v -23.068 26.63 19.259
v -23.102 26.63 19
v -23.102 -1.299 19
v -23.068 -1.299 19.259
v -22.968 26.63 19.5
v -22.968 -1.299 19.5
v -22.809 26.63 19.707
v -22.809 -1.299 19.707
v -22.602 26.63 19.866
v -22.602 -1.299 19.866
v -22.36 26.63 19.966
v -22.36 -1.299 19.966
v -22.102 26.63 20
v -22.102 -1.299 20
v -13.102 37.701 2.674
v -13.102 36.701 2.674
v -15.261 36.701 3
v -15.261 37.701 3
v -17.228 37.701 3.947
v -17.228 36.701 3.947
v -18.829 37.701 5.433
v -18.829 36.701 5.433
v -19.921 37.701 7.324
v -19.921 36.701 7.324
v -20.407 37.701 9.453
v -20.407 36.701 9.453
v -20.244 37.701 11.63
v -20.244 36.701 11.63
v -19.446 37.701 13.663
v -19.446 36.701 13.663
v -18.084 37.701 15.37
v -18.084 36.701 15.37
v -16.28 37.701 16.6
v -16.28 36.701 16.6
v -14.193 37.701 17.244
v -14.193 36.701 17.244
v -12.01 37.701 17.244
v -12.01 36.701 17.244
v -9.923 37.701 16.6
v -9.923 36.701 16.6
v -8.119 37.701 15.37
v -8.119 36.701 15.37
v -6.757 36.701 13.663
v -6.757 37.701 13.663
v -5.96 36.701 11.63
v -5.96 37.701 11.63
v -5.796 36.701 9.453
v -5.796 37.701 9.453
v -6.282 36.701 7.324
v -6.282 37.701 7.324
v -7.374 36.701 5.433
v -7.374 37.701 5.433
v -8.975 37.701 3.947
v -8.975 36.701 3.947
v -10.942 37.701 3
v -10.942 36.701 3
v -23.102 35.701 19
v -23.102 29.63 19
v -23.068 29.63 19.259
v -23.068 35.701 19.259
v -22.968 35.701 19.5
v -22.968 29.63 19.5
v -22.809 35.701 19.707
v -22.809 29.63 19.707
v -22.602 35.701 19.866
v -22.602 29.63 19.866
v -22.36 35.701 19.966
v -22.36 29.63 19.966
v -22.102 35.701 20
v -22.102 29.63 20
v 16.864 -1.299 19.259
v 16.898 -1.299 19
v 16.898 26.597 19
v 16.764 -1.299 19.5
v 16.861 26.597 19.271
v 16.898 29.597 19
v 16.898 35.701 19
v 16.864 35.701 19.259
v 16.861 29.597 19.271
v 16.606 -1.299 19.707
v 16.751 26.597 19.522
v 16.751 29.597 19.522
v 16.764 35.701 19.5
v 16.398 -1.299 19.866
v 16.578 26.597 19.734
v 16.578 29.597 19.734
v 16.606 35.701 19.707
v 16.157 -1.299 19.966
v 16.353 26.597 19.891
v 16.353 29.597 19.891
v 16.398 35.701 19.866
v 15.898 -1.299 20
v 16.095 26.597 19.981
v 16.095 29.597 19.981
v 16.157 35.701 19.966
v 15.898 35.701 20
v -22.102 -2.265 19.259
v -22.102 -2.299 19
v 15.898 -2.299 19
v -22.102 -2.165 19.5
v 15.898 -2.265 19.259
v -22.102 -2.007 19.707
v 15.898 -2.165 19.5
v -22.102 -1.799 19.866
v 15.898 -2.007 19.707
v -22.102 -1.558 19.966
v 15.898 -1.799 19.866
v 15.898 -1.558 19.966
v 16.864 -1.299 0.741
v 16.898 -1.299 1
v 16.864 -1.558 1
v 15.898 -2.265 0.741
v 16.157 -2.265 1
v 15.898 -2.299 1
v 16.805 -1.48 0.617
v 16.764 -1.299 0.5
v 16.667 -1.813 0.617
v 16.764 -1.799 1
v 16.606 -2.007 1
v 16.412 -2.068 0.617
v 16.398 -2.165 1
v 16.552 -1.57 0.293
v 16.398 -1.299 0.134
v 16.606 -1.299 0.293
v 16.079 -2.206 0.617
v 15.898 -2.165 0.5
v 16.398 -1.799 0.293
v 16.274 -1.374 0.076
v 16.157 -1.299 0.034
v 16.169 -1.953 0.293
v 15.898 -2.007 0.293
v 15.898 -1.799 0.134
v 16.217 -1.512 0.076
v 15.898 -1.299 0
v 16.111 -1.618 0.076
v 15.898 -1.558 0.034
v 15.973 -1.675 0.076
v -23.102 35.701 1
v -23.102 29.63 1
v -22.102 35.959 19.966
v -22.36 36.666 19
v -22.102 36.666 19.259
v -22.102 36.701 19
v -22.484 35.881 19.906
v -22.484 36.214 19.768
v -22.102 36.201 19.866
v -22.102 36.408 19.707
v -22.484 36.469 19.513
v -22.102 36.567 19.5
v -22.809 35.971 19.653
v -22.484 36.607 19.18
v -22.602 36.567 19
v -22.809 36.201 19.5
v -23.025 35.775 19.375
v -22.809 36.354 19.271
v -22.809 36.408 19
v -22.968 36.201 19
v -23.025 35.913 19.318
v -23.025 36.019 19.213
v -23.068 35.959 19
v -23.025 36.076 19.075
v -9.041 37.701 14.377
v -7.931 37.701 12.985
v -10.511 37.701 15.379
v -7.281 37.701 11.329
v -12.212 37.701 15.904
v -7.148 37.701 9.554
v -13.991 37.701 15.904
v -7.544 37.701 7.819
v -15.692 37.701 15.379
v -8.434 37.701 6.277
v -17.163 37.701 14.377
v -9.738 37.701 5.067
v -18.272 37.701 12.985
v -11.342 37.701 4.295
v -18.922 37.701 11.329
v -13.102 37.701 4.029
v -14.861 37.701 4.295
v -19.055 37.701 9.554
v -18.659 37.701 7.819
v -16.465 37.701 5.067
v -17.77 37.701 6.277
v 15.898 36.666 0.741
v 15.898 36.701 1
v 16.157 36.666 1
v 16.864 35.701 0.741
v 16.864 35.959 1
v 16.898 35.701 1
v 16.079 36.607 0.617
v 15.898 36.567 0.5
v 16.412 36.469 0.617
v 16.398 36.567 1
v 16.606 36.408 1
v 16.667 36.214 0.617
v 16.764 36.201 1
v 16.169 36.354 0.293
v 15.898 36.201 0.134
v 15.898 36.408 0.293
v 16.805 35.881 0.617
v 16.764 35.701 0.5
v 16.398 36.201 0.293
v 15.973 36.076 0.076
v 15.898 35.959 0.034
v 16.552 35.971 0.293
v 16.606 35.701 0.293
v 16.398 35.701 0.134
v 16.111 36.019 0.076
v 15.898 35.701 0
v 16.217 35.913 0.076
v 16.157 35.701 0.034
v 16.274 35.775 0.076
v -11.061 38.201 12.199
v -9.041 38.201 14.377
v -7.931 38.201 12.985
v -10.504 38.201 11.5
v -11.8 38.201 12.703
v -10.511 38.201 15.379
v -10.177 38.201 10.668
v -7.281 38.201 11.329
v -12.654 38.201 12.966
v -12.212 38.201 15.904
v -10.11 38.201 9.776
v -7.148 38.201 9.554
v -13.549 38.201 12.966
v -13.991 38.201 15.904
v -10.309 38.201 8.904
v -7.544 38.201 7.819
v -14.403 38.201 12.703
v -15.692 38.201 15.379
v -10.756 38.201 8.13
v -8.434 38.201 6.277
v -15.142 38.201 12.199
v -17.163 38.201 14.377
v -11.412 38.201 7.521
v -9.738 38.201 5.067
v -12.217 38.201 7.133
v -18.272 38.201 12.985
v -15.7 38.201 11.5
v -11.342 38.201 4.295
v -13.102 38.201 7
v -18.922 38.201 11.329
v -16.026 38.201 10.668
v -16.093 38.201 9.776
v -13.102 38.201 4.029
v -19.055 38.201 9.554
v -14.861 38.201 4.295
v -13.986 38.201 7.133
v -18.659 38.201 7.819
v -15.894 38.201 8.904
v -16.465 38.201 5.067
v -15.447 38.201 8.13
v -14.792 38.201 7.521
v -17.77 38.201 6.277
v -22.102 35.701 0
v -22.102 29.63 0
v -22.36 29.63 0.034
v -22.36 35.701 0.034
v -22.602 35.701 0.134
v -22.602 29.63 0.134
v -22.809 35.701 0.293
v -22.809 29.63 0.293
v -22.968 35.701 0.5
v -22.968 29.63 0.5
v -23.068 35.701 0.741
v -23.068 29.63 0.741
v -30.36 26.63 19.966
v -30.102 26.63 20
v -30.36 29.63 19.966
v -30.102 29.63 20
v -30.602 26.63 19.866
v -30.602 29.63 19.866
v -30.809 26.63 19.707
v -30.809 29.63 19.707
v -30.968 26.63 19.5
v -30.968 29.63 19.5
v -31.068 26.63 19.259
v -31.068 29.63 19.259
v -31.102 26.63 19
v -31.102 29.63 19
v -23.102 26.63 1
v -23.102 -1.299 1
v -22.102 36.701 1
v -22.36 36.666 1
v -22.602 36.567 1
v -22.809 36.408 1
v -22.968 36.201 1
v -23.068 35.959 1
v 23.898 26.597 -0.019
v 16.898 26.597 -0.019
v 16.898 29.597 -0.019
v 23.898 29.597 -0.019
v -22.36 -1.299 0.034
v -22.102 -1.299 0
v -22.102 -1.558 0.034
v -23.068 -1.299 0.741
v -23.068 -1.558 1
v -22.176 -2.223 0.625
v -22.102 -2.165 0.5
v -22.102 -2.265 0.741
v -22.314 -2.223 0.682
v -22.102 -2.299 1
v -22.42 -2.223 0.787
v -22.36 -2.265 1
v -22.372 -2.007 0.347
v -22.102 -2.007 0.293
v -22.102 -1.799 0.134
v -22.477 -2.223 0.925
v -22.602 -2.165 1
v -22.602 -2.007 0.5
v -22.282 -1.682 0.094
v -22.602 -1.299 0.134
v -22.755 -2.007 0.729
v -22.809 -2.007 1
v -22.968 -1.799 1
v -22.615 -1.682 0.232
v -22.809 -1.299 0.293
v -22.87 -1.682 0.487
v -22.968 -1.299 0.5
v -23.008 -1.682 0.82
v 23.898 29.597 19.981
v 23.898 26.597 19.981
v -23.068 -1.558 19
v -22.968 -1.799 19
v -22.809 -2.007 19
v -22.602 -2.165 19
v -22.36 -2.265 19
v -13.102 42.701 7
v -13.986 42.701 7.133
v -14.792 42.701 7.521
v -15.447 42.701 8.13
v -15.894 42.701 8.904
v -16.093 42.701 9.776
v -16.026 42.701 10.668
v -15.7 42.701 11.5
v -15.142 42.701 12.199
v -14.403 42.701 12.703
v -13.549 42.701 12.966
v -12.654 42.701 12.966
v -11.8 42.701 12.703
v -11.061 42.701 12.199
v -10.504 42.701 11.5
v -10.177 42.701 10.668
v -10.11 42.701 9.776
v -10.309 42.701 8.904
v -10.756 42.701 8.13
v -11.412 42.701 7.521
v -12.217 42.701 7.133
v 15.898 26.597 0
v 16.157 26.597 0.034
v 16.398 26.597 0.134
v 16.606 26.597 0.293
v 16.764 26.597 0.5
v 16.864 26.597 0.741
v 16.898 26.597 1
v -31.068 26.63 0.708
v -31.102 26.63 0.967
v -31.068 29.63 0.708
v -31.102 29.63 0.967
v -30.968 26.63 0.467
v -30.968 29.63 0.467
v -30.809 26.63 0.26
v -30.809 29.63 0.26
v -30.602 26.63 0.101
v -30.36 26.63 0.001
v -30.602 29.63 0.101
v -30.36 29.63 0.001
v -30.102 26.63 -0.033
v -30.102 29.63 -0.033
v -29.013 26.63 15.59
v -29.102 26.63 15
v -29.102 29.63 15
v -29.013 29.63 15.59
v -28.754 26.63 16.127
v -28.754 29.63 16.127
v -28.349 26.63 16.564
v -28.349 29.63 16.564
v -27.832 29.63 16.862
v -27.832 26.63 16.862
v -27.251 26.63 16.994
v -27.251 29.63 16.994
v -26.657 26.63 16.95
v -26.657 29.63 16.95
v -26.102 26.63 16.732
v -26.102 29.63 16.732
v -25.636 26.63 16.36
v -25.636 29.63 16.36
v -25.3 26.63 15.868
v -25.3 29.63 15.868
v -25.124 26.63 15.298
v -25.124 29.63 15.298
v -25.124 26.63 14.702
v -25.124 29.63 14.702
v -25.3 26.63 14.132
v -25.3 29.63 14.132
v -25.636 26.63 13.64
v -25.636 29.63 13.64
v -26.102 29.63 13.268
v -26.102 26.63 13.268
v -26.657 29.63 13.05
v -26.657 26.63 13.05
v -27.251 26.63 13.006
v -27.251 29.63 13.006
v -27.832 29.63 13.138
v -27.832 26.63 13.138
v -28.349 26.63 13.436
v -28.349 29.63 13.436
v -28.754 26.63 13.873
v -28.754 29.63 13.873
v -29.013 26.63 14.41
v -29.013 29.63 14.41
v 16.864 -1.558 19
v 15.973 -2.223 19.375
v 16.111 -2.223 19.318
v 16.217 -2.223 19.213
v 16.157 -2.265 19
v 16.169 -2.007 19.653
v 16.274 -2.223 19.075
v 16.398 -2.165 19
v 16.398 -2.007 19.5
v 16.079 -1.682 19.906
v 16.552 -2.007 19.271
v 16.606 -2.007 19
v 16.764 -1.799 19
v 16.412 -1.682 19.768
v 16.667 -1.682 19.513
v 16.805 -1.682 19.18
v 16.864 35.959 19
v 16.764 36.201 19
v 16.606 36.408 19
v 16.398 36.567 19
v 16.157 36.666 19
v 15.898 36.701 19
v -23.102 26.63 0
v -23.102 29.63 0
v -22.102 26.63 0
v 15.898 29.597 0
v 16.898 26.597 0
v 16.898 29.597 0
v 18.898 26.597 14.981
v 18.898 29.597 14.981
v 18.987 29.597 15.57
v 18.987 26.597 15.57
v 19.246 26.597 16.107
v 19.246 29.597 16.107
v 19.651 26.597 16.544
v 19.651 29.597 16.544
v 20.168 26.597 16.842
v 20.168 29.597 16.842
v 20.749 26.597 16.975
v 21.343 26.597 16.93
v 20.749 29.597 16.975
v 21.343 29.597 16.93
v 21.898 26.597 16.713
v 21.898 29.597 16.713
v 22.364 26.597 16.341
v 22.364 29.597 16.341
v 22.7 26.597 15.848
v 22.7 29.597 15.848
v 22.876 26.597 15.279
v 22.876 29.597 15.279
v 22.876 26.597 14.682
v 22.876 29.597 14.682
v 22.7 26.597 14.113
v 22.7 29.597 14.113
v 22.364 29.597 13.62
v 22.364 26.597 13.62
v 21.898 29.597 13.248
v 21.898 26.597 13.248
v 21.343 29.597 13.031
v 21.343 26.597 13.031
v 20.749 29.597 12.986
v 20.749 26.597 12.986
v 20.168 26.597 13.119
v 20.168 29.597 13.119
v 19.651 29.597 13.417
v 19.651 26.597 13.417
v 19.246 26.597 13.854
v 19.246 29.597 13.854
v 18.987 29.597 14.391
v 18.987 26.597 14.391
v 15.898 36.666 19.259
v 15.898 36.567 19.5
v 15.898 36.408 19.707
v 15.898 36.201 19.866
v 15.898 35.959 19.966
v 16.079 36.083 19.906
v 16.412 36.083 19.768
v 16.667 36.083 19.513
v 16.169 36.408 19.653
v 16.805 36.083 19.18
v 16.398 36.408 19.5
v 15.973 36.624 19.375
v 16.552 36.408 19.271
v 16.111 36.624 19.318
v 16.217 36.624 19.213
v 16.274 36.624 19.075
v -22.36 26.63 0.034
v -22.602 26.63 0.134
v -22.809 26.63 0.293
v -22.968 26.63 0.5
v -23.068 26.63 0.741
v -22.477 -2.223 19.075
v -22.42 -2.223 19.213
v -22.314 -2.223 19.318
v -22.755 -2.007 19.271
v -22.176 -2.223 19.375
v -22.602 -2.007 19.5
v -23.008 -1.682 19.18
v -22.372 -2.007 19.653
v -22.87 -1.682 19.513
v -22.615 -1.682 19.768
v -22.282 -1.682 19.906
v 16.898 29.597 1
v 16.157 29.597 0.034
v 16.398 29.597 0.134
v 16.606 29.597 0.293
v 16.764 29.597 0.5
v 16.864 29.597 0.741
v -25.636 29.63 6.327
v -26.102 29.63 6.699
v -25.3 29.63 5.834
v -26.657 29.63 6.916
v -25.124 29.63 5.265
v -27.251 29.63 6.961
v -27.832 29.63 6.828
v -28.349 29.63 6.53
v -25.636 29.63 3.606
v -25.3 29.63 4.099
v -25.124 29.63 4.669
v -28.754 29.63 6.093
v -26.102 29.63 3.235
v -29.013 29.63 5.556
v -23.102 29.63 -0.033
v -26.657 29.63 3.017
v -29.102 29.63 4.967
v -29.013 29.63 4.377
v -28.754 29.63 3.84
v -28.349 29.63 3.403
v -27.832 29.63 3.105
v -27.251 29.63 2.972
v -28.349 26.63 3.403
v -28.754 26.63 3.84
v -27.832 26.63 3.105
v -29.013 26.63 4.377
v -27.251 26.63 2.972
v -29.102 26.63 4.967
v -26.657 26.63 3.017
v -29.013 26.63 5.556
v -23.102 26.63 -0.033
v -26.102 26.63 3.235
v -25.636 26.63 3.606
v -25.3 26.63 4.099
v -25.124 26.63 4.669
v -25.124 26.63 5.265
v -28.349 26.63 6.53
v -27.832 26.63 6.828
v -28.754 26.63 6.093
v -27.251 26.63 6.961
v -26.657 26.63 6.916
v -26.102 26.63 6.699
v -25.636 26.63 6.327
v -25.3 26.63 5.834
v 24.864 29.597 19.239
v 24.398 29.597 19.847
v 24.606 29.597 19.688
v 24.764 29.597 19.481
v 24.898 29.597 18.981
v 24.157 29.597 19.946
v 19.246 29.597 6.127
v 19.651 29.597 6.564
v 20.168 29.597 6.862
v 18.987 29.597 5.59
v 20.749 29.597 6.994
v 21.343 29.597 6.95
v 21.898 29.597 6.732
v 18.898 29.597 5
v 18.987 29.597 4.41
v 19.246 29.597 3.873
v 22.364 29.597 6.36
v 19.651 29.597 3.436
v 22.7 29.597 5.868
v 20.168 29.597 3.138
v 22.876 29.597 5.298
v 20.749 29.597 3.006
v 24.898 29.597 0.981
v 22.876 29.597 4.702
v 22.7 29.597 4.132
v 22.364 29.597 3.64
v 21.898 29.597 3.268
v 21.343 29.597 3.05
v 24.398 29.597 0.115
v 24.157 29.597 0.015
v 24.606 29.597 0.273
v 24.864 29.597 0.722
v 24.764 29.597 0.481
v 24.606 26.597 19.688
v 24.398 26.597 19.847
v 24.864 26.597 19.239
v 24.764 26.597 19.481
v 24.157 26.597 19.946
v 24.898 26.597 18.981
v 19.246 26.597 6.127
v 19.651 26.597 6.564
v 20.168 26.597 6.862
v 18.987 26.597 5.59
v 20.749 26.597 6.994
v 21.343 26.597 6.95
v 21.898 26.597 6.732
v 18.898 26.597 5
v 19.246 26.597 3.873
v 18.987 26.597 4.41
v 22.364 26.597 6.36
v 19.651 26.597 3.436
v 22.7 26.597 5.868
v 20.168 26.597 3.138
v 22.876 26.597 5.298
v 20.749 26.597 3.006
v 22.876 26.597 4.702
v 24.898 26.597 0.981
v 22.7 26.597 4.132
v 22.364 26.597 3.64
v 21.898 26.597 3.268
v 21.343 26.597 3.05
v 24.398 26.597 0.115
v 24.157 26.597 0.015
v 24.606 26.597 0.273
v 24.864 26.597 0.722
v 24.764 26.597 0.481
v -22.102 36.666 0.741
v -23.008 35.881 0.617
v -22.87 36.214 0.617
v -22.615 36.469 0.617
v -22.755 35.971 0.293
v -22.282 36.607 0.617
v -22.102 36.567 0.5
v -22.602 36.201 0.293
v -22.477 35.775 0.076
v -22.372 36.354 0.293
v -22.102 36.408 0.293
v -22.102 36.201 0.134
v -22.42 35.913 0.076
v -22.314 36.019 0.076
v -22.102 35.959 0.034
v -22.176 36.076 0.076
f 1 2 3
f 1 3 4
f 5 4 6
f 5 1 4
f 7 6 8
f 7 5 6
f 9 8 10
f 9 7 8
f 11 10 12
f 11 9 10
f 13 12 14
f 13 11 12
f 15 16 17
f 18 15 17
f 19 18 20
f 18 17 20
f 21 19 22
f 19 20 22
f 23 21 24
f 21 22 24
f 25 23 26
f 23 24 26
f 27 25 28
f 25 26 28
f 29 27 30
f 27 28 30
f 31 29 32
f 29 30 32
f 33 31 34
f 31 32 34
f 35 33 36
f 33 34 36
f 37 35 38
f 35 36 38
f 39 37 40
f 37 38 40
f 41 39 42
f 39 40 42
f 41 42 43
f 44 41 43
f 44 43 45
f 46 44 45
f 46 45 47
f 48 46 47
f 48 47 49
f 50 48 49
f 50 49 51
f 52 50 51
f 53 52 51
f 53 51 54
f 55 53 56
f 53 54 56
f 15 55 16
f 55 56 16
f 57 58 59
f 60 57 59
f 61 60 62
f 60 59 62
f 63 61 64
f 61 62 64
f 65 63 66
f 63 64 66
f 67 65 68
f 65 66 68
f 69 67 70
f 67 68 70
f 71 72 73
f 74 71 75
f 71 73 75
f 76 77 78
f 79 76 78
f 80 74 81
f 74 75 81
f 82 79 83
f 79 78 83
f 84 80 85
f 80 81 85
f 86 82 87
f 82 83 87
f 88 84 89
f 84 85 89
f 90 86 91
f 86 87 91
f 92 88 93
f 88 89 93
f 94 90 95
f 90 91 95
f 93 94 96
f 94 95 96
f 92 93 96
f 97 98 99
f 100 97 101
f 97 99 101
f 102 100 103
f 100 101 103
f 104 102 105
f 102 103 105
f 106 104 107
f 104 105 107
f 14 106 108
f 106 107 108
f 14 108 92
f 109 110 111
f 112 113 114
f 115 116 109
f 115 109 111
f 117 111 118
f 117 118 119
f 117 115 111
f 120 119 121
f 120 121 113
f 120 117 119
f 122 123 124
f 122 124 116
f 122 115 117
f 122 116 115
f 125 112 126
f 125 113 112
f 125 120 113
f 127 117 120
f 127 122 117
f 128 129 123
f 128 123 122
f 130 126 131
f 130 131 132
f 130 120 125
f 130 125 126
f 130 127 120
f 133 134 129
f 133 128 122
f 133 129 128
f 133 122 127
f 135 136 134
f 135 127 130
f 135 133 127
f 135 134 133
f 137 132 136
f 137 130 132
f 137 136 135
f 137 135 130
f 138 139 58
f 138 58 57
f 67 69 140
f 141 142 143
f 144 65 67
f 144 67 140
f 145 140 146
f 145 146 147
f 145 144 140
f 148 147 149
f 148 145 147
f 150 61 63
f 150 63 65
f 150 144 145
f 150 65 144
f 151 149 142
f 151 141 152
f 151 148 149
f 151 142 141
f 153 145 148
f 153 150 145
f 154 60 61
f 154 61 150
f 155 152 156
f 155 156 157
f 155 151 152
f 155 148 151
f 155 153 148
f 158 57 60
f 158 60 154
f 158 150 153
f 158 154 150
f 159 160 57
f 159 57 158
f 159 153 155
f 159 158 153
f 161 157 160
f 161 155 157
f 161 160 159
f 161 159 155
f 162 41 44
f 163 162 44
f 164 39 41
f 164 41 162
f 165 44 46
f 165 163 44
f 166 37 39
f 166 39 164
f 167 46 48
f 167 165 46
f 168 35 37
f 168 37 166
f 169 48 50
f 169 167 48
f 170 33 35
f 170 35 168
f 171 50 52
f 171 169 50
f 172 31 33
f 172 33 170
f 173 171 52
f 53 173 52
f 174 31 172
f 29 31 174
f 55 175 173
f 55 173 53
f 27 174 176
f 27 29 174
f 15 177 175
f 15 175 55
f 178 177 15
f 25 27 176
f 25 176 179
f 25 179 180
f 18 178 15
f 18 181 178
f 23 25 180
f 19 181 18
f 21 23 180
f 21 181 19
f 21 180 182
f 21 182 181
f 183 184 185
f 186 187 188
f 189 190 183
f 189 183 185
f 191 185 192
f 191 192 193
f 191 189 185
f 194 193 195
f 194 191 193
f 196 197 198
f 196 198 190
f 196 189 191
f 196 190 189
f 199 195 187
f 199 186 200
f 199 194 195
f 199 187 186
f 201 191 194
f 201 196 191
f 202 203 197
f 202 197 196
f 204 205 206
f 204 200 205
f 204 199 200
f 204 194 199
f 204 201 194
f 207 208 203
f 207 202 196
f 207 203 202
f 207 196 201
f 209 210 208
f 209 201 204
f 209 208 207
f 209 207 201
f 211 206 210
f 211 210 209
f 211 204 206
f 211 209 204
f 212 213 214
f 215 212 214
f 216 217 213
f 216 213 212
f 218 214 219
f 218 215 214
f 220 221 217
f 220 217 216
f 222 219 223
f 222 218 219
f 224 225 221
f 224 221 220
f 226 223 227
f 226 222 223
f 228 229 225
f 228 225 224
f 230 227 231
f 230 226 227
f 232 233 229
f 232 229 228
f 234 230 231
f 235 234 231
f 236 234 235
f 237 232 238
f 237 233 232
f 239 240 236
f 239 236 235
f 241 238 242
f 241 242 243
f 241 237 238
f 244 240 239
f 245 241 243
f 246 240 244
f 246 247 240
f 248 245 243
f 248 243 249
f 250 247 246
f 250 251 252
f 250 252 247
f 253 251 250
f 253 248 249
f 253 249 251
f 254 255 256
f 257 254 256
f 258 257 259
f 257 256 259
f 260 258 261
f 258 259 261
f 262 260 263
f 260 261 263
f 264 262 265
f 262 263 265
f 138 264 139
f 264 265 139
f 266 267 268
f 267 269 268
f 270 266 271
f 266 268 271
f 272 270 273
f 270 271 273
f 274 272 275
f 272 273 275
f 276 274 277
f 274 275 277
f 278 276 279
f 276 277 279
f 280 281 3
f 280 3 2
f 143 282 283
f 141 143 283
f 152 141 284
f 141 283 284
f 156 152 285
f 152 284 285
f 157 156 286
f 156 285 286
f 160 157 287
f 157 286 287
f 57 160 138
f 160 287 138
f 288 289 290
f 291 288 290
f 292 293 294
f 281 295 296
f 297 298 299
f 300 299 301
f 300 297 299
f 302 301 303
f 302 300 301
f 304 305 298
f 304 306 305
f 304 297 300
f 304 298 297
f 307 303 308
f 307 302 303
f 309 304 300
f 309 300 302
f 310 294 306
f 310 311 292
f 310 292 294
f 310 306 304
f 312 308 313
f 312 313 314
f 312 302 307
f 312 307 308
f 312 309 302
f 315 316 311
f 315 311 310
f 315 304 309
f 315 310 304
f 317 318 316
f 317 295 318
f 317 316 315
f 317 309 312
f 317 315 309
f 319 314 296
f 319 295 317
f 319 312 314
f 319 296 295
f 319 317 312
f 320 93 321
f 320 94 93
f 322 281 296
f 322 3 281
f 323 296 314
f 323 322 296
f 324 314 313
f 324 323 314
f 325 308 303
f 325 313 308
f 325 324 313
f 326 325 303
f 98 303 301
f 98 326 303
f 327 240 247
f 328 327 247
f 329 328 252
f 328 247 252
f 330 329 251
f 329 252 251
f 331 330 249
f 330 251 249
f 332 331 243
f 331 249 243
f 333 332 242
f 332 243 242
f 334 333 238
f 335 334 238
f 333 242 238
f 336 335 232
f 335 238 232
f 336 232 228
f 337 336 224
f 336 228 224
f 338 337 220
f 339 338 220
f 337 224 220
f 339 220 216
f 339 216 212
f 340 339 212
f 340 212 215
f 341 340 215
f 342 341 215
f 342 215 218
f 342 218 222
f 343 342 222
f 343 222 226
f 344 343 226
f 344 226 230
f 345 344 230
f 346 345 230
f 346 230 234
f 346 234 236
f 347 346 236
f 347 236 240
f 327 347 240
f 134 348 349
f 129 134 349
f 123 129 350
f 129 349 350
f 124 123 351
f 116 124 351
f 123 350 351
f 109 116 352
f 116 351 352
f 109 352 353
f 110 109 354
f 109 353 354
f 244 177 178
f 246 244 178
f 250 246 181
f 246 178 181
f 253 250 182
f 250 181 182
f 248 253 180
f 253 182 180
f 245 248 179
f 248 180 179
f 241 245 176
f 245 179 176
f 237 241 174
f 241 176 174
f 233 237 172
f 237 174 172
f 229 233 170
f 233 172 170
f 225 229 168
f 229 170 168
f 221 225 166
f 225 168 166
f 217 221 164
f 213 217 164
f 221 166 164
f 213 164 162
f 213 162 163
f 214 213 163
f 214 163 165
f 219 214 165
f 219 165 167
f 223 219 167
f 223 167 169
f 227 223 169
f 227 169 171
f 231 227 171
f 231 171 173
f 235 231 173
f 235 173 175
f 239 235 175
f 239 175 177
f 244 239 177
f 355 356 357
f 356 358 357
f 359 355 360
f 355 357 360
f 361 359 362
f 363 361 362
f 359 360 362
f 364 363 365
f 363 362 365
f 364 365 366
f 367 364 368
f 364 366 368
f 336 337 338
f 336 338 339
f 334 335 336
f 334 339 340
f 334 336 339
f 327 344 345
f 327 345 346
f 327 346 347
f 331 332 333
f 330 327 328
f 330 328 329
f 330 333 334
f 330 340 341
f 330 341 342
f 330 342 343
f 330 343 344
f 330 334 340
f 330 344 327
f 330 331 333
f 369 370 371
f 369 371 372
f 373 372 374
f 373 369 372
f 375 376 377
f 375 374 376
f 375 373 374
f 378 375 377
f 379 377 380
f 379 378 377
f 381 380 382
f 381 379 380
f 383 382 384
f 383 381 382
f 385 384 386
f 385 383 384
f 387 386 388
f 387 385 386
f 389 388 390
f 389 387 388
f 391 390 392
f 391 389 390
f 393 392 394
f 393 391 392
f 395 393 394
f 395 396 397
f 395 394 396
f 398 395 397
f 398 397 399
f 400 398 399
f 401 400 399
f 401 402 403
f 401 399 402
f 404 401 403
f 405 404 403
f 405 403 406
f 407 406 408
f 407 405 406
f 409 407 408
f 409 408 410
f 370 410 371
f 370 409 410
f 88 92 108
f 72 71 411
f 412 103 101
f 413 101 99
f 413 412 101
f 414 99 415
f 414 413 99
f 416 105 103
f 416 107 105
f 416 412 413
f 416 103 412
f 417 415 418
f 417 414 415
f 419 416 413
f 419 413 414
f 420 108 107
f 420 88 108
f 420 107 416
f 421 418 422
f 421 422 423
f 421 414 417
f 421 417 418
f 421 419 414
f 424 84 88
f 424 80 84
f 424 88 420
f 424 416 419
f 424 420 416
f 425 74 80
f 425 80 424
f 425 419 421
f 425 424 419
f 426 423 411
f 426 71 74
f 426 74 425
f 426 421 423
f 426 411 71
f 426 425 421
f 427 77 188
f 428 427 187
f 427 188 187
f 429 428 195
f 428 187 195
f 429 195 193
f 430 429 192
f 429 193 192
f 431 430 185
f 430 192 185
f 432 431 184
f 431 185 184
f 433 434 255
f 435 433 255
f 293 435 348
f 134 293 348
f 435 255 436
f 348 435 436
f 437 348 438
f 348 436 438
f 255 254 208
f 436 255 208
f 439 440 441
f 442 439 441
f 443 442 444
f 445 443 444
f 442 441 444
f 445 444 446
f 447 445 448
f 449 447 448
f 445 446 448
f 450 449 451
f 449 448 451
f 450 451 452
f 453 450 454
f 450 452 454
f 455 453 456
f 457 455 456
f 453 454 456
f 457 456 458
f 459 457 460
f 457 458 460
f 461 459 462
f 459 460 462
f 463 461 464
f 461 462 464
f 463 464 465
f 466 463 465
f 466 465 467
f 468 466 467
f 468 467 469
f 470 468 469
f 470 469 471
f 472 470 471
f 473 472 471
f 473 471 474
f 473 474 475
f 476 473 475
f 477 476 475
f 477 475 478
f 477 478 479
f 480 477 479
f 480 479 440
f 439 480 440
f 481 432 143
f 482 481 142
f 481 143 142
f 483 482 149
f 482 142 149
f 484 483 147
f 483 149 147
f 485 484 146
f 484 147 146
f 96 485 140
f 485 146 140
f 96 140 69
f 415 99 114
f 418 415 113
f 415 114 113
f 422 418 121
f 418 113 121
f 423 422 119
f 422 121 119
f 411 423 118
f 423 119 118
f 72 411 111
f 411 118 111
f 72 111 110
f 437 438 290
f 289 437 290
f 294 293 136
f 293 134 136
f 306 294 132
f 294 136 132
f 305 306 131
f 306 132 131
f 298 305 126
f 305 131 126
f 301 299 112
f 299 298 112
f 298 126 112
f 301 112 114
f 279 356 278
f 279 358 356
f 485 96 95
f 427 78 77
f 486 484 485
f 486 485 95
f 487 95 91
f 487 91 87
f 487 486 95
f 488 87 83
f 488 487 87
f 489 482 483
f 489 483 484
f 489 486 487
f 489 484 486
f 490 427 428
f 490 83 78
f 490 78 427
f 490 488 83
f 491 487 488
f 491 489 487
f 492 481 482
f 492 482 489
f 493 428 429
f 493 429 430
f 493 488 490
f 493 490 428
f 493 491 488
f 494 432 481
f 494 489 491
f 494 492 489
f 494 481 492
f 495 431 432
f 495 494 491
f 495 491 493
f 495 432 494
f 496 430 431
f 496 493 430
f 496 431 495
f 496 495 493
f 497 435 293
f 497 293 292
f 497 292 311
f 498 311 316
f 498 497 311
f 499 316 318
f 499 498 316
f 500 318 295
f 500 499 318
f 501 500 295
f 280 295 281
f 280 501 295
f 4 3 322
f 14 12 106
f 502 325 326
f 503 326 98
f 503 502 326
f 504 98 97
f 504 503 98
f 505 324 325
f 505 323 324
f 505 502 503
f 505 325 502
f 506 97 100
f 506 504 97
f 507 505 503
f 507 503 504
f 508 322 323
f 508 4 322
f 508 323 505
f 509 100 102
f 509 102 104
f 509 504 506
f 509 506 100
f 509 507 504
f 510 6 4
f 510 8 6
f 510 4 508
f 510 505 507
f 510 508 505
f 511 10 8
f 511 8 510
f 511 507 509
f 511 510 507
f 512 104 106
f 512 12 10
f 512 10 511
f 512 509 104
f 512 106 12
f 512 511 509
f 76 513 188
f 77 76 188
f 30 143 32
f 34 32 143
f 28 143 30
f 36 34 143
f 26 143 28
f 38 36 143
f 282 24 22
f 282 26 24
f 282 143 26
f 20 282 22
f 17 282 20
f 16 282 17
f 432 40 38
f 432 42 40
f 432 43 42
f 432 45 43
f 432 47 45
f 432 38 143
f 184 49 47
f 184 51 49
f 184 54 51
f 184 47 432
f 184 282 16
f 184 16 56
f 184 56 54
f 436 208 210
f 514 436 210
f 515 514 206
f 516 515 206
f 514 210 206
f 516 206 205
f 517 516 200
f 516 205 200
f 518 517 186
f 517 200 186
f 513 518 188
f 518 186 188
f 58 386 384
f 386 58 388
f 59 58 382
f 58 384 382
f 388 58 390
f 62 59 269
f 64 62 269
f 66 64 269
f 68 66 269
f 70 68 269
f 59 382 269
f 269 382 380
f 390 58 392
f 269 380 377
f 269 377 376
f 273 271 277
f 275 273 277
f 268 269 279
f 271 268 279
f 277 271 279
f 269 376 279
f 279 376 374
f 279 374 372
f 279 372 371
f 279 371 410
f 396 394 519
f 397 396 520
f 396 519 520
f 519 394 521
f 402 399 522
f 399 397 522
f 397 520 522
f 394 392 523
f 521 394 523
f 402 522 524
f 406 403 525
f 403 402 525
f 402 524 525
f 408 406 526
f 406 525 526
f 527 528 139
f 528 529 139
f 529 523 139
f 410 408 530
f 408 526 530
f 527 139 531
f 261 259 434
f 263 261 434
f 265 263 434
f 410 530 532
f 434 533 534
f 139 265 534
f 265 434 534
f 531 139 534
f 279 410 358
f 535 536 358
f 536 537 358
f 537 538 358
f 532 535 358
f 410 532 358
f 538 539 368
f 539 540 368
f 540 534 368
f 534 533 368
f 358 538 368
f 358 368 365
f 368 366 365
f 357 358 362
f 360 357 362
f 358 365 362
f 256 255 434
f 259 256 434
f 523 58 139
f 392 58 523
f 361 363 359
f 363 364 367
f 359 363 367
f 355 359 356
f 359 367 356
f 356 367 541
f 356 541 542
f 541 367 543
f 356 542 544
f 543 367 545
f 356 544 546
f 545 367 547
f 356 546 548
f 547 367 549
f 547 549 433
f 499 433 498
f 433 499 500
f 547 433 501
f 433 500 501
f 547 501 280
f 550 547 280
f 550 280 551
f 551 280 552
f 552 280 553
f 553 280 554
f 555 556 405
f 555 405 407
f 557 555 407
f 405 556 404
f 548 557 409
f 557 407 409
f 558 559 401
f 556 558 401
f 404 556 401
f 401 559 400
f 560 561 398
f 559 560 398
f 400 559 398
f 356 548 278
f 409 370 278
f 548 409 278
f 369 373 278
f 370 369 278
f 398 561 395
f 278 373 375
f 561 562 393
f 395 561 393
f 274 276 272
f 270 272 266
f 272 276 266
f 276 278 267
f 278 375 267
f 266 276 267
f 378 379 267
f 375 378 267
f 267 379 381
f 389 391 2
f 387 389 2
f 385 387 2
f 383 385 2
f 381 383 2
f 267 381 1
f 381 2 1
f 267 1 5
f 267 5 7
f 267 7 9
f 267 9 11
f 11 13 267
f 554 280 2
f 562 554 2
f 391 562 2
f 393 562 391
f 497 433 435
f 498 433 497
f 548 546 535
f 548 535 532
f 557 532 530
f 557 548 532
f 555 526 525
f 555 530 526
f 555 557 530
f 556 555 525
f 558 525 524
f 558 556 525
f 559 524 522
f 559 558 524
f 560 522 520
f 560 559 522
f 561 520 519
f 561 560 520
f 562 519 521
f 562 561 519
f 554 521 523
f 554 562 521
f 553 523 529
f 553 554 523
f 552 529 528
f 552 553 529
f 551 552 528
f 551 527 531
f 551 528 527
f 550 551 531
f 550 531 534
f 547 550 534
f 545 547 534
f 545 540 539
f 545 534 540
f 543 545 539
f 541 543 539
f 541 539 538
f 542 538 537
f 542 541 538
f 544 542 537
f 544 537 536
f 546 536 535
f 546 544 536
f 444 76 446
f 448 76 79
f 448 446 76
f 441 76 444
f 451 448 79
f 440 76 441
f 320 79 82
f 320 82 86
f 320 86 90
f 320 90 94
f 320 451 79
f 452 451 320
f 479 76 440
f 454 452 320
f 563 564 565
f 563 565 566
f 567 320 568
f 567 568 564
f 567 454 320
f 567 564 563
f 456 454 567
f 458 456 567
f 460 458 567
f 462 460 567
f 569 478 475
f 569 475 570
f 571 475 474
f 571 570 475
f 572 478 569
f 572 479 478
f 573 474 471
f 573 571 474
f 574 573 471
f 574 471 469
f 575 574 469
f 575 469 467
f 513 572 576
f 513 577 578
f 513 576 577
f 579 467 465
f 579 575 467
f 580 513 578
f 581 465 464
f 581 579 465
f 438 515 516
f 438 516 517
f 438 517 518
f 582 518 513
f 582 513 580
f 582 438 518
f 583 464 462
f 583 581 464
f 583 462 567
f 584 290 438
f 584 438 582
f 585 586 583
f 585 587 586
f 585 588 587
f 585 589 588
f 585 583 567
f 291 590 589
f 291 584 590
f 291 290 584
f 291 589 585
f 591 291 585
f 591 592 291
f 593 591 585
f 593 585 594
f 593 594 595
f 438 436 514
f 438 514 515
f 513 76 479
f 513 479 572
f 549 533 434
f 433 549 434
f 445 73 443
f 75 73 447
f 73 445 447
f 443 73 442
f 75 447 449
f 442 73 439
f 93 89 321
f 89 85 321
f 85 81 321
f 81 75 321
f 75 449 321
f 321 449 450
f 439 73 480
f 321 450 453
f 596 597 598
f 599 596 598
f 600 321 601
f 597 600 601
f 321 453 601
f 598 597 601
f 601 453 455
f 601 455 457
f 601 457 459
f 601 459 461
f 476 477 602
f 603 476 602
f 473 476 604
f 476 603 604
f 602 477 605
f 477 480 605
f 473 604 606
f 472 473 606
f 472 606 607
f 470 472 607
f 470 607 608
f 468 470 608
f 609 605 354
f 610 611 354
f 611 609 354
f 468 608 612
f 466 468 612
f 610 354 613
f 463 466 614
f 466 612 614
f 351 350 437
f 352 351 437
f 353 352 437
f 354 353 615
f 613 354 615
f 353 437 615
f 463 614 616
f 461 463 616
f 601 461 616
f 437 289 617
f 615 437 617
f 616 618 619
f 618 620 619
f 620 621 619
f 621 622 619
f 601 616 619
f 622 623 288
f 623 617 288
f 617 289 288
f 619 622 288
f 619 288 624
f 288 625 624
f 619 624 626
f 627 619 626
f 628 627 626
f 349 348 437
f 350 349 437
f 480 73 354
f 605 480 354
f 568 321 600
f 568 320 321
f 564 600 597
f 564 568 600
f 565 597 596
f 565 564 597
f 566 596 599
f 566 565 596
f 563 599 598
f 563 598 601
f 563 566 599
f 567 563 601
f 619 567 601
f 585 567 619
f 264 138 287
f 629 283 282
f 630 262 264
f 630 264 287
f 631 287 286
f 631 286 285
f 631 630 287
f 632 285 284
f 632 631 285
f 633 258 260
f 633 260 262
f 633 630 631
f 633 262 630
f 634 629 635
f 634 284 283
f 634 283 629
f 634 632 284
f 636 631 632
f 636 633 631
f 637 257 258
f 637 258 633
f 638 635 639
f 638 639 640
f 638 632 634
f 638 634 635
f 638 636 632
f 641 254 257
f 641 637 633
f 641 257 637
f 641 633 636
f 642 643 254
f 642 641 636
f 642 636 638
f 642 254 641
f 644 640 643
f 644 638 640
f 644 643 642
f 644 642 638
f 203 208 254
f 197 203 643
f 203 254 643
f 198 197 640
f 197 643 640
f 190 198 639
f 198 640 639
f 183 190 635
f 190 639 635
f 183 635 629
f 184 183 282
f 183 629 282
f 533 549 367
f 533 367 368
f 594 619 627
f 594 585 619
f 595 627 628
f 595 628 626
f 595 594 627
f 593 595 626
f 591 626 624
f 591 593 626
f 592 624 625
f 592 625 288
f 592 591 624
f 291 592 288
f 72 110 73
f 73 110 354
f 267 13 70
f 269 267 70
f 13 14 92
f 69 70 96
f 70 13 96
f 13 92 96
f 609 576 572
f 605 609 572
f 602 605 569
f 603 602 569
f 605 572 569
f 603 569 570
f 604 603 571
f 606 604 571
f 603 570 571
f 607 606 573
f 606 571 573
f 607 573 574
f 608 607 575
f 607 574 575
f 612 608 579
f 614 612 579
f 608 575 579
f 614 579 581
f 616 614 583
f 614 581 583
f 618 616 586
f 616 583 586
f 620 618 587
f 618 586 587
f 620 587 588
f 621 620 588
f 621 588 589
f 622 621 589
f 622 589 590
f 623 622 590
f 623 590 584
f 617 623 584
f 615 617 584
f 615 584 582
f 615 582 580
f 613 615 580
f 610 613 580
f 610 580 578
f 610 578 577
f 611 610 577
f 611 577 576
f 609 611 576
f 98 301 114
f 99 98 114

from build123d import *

# Parameters (mm, degrees)
SKETCH_1_W               = 40
SKETCH_1_H               = 39
EXTRUDE_1_DEPTH          = 20
SKETCH_3_W               = 20
SKETCH_3_H               = 3
EXTRUDE_2_DEPTH          = 8
SKETCH_6_W               = 20.033379722
SKETCH_6_H               = 3
EXTRUDE_4_DEPTH          = 8
CUT_EXTRUDE_1_DEPTH      = 38
CUT_EXTRUDE_1_DEPTH_BACK = 50
SKETCH_7_R               = 2
SKETCH_8_R               = 2
CUT_EXTRUDE_2_DEPTH      = 50
SKETCH_9_R               = 3
EXTRUDE_7_DEPTH          = 6
SKETCH_11_R              = 5.970559472
EXTRUDE_8_DEPTH          = 1.5
SKETCH_12_R              = 7.325621725
EXTRUDE_9_DEPTH          = 1
FILLET_3_R               = 1
FILLET_4_R               = 1
FILLET_5_R               = 1
FILLET_8_R               = 1
FILLET_9_R               = 1


with BuildPart() as part:
    # 草图1 → 凸台-拉伸1 (new body)
    with BuildSketch(Plane.XY):
        with Locations((-3.101604278, 17.200534759)):
            Rectangle(SKETCH_1_W, SKETCH_1_H)
    extrude(amount=EXTRUDE_1_DEPTH)

    # 草图3 → 凸台-拉伸2 (add)
    with BuildSketch(Plane(origin=(16.898395722, 0, 0), x_dir=(0, 0, -1), z_dir=(1, 0, 0))):
        with Locations((-9.980536854, 28.09692648)):
            Rectangle(SKETCH_3_W, SKETCH_3_H)
    extrude(amount=EXTRUDE_2_DEPTH)

    # 草图6 → 凸台-拉伸4 (add)
    with BuildSketch(Plane.ZY.offset(23.101604278)):
        with Locations((9.983310139, 28.130306202)):
            Rectangle(SKETCH_6_W, SKETCH_6_H)
    extrude(amount=EXTRUDE_4_DEPTH)

    # 草图7 → 切除-拉伸1 (cut, two sides: drawn at the far end of the back side and taken through both)
    with BuildSketch(Plane(origin=(0, 0, 0), x_dir=(1, 0, 0), z_dir=(0, 1, 0)).offset(-CUT_EXTRUDE_1_DEPTH_BACK)):
        with Locations(Location((-27.101604278, -15, 0), (0, 0, 180))):
            Circle(SKETCH_7_R)
        with Locations(Location((-27.101604278, -4.966620278, 0), (0, 0, 180))):
            Circle(SKETCH_7_R)
    extrude(amount=CUT_EXTRUDE_1_DEPTH + CUT_EXTRUDE_1_DEPTH_BACK, mode=Mode.SUBTRACT)

    # 草图8 → 切除-拉伸2 (cut)
    with BuildSketch(Plane(origin=(0, 29.59692648, 0), x_dir=(1, 0, 0), z_dir=(0, 1, 0))):
        with Locations(Location((20.898395722, -5, 0), (0, 0, 180))):
            Circle(SKETCH_8_R)
        with Locations(Location((20.898395722, -14.980536854, 0), (0, 0, 180))):
            Circle(SKETCH_8_R)
    extrude(amount=-CUT_EXTRUDE_2_DEPTH, mode=Mode.SUBTRACT)

    # 草图9 → 凸台-拉伸7 (add)
    with BuildSketch(Plane(origin=(0, 36.700534759, 0), x_dir=(1, 0, 0), z_dir=(0, 1, 0))):
        with Locations(Location((-13.101604278, -10, 0), (0, 0, 90))):
            Circle(SKETCH_9_R)
    extrude(amount=EXTRUDE_7_DEPTH)

    # 草图11 → 凸台-拉伸8 (add)
    with BuildSketch(Plane(origin=(0, 36.700534759, 0), x_dir=(1, 0, 0), z_dir=(0, 1, 0))):
        with Locations(Location((-13.101604278, -10, 0), (0, 0, 90))):
            Circle(SKETCH_11_R)
    extrude(amount=EXTRUDE_8_DEPTH)

    # 草图12 → 凸台-拉伸9 (add)
    with BuildSketch(Plane(origin=(0, 36.700534759, 0), x_dir=(1, 0, 0), z_dir=(0, 1, 0))):
        with Locations(Location((-13.101604278, -10, 0), (0, 0, 90))):
            Circle(SKETCH_12_R)
    extrude(amount=EXTRUDE_9_DEPTH)

    # 圆角3
    # the kernel refuses this fillet: 1 mm, written as the material it takes off along each edge
    with BuildSketch(Plane(origin=(15.898395722, 35.700534759, 19), x_dir=(0, 0, 1), z_dir=(0, 1, 0))) as fillet_3_piece_1_section:
        Polygon((0, 0), (FILLET_3_R, 0), (FILLET_3_R, FILLET_3_R), (0, FILLET_3_R), align=None)
    fillet_3_piece_1 = extrude(amount=FILLET_3_R, mode=Mode.PRIVATE)
    fillet_3_piece_1 = fillet_3_piece_1 - Plane(origin=(15.898395722, 35.700534759, 19), x_dir=(-0.7071067811865475, 0, -0.7071067811865475), z_dir=(0, 1, 0)) * Sphere(FILLET_3_R, mode=Mode.PRIVATE)
    add(fillet_3_piece_1, mode=Mode.SUBTRACT)
    with BuildSketch(Plane(origin=(16.898395722, 36.700534759, -2.5), x_dir=(-1, 0, 0), z_dir=(0, 0, 1))) as fillet_3_piece_2:
        with BuildLine():
            CenterArc((FILLET_3_R, FILLET_3_R), FILLET_3_R, 180, 90)
            Line((0, FILLET_3_R), (0, 0))
            Line((0, 0), (FILLET_3_R, 0))
        make_face()
    extrude(amount=21.5, mode=Mode.SUBTRACT)
    with BuildSketch(Plane(origin=(16.898395722, 35.700534759, 20), x_dir=(-1, 0, 0), z_dir=(0, -1, 0))) as fillet_3_piece_3_section:
        with BuildLine():
            CenterArc((FILLET_3_R, FILLET_3_R), FILLET_3_R, 180, 90)
            Line((0, FILLET_3_R), (0, 0))
            Line((0, 0), (FILLET_3_R, 0))
        make_face()
    fillet_3_piece_3 = extrude(amount=40.5, mode=Mode.PRIVATE)
    fillet_3_piece_3 = split(fillet_3_piece_3, bisect_by=Plane(origin=(16.437934638, 29.59692648, 20.00107683), z_dir=(0, 1, 0)), keep=Keep.TOP, mode=Mode.PRIVATE)
    fillet_3_piece_3 = split(fillet_3_piece_3, bisect_by=Plane(origin=(16.437934638, 32.648730619, 19.980536854), z_dir=(0, 0, 1)), keep=Keep.TOP, mode=Mode.PRIVATE)
    add(fillet_3_piece_3, mode=Mode.SUBTRACT)
    with BuildSketch(Plane(origin=(16.898395722, 35.700534759, 20), x_dir=(-1, 0, 0), z_dir=(0, -1, 0))) as fillet_3_piece_4_section:
        with BuildLine():
            CenterArc((FILLET_3_R, FILLET_3_R), FILLET_3_R, 180, 90)
            Line((0, FILLET_3_R), (0, 0))
            Line((0, 0), (FILLET_3_R, 0))
        make_face()
    fillet_3_piece_4 = extrude(amount=40.5, mode=Mode.PRIVATE)
    fillet_3_piece_4 = split(fillet_3_piece_4, bisect_by=Plane(origin=(16.712608884, 29.59692648, 19.734140611), z_dir=(0, 1, 0)), keep=Keep.TOP, mode=Mode.PRIVATE)
    fillet_3_piece_4 = split(fillet_3_piece_4, bisect_by=Plane(origin=(16.712608884, 32.648730619, 19.980536854), z_dir=(0, 0, -1)), keep=Keep.TOP, mode=Mode.PRIVATE)
    add(fillet_3_piece_4, mode=Mode.SUBTRACT)
    with BuildSketch(Plane(origin=(16.898395722, 35.700534759, 20), x_dir=(-1, 0, 0), z_dir=(0, -1, 0))) as fillet_3_piece_5_section:
        with BuildLine():
            CenterArc((FILLET_3_R, FILLET_3_R), FILLET_3_R, 180, 90)
            Line((0, FILLET_3_R), (0, 0))
            Line((0, 0), (FILLET_3_R, 0))
        make_face()
    fillet_3_piece_5 = extrude(amount=40.5, mode=Mode.PRIVATE)
    fillet_3_piece_5 = split(fillet_3_piece_5, bisect_by=Plane(origin=(16.437934638, 29.59692648, 20.00107683), z_dir=(0, -1, 0)), keep=Keep.TOP, mode=Mode.PRIVATE)
    fillet_3_piece_5 = split(fillet_3_piece_5, bisect_by=Plane(origin=(16.437934638, 28.09692648, 19.980536854), z_dir=(0, 0, 1)), keep=Keep.TOP, mode=Mode.PRIVATE)
    fillet_3_piece_5 = split(fillet_3_piece_5, bisect_by=Plane(origin=(16.437934638, 26.59692648, 20.00107683), z_dir=(0, 1, 0)), keep=Keep.TOP, mode=Mode.PRIVATE)
    add(fillet_3_piece_5, mode=Mode.SUBTRACT)
    with BuildSketch(Plane(origin=(16.898395722, 35.700534759, 20), x_dir=(-1, 0, 0), z_dir=(0, -1, 0))) as fillet_3_piece_6_section:
        with BuildLine():
            CenterArc((FILLET_3_R, FILLET_3_R), FILLET_3_R, 180, 90)
            Line((0, FILLET_3_R), (0, 0))
            Line((0, 0), (FILLET_3_R, 0))
        make_face()
    fillet_3_piece_6 = extrude(amount=40.5, mode=Mode.PRIVATE)
    fillet_3_piece_6 = split(fillet_3_piece_6, bisect_by=Plane(origin=(16.437934638, 10.898730619, 19.980536854), z_dir=(0, 0, 1)), keep=Keep.TOP, mode=Mode.PRIVATE)
    fillet_3_piece_6 = split(fillet_3_piece_6, bisect_by=Plane(origin=(16.437934638, 26.59692648, 20.00107683), z_dir=(0, -1, 0)), keep=Keep.TOP, mode=Mode.PRIVATE)
    add(fillet_3_piece_6, mode=Mode.SUBTRACT)
    with BuildSketch(Plane(origin=(16.898395722, 35.700534759, 20), x_dir=(-1, 0, 0), z_dir=(0, -1, 0))) as fillet_3_piece_7_section:
        with BuildLine():
            CenterArc((FILLET_3_R, FILLET_3_R), FILLET_3_R, 180, 90)
            Line((0, FILLET_3_R), (0, 0))
            Line((0, 0), (FILLET_3_R, 0))
        make_face()
    fillet_3_piece_7 = extrude(amount=40.5, mode=Mode.PRIVATE)
    fillet_3_piece_7 = split(fillet_3_piece_7, bisect_by=Plane(origin=(16.712608884, 10.898730619, 19.980536854), z_dir=(0, 0, -1)), keep=Keep.TOP, mode=Mode.PRIVATE)
    fillet_3_piece_7 = split(fillet_3_piece_7, bisect_by=Plane(origin=(16.712608884, 26.59692648, 19.734140611), z_dir=(0, -1, 0)), keep=Keep.TOP, mode=Mode.PRIVATE)
    add(fillet_3_piece_7, mode=Mode.SUBTRACT)
    with BuildSketch(Plane(origin=(-25.601604278, 36.700534759, 20), x_dir=(0, 0, -1), z_dir=(1, 0, 0))) as fillet_3_piece_8:
        with BuildLine():
            CenterArc((FILLET_3_R, -FILLET_3_R), FILLET_3_R, 90, 90)
            Line((0, -FILLET_3_R), (0, 0))
            Line((0, 0), (FILLET_3_R, 0))
        make_face()
    extrude(amount=41.5, mode=Mode.SUBTRACT)

    # 圆角4
    fillet_4_edges = [part.edges().sort_by_distance(p)[0] for p in [
        (-23.101604278, 12.16542048, 0),
        (-23.101604278, 12.16542048, 20),
        (-3.101604278, -2.299465241, 0),
        (-23.101604278, -2.299465241, 10),
        (-3.601604278, -2.299465241, 20),
        (16.898395722, -2.299465241, 9.5),
        (16.605502503, -2.299465241, 19.707106781),
    ]]
    fillet(fillet_4_edges, radius=FILLET_4_R)

    # 圆角5
    # the kernel refuses this fillet: 1 mm, written as the material it takes off along each edge
    with BuildSketch(Plane(origin=(15.898395722, -1.299465241, 1), x_dir=(1, 0, 0), z_dir=(0, 0, -1))) as fillet_5_piece_1_section:
        Polygon((0, 0), (FILLET_5_R * 1.02, 0), (FILLET_5_R * 1.02, FILLET_5_R * 1.02), (0, FILLET_5_R * 1.02), align=None)
    fillet_5_piece_1 = extrude(amount=FILLET_5_R * 1.02, mode=Mode.PRIVATE)
    fillet_5_piece_1 = fillet_5_piece_1 - Plane(origin=(15.898395722, -1.299465241, 1), x_dir=(-0.7071067811865476, 0.7071067811865475, 0), z_dir=(0, 0, -1)) * Sphere(FILLET_5_R, mode=Mode.PRIVATE)
    add(fillet_5_piece_1, mode=Mode.SUBTRACT)
    with BuildSketch(Plane(origin=(-22.101604278, 35.700534759, 1), x_dir=(-1, 0, 0), z_dir=(0, 0, -1))) as fillet_5_piece_2_section:
        Polygon((0, 0), (FILLET_5_R * 1.02, 0), (FILLET_5_R * 1.02, FILLET_5_R * 1.02), (0, FILLET_5_R * 1.02), align=None)
    fillet_5_piece_2 = extrude(amount=FILLET_5_R * 1.02, mode=Mode.PRIVATE)
    fillet_5_piece_2 = fillet_5_piece_2 - Plane(origin=(-22.101604278, 35.700534759, 1), x_dir=(0.7071067811865476, -0.7071067811865475, 0), z_dir=(0, 0, -1)) * Sphere(FILLET_5_R, mode=Mode.PRIVATE)
    add(fillet_5_piece_2, mode=Mode.SUBTRACT)
    with BuildSketch(Plane(origin=(16.898395722, 26.59692648, 0), x_dir=(-1, 0, 0), z_dir=(0, -1, 0))) as fillet_5_piece_3:
        with BuildLine():
            CenterArc((FILLET_5_R, -FILLET_5_R), FILLET_5_R, 90, 90)
            Line((0, -FILLET_5_R), (0, 0))
            Line((0, 0), (FILLET_5_R, 0))
        make_face()
    extrude(amount=27.89639172, mode=Mode.SUBTRACT)
    with BuildSketch(Plane(origin=(16.898395722, 35.700534759, 0), x_dir=(-1, 0, 0), z_dir=(0, -1, 0))) as fillet_5_piece_4:
        with BuildLine():
            CenterArc((FILLET_5_R, -FILLET_5_R), FILLET_5_R, 90, 90)
            Line((0, -FILLET_5_R), (0, 0))
            Line((0, 0), (FILLET_5_R, 0))
        make_face()
    extrude(amount=6.10360828, mode=Mode.SUBTRACT)
    with BuildSketch(Plane(origin=(-23.101604278, 29.630306202, 0), x_dir=(1, 0, 0), z_dir=(0, 1, 0)), Plane(origin=(-23.101604278, 29.630306202, 20), x_dir=(0, 0, -1), z_dir=(0, 1, 0))) as fillet_5_piece_5:
        with BuildLine():
            CenterArc((FILLET_5_R, -FILLET_5_R), FILLET_5_R, 90, 90)
            Line((0, -FILLET_5_R), (0, 0))
            Line((0, 0), (FILLET_5_R, 0))
        make_face()
    extrude(amount=6.070228558, mode=Mode.SUBTRACT)
    with BuildSketch(Plane(origin=(-22.101604278, 36.700534759, 0), x_dir=(0, -1, 0), z_dir=(1, 0, 0))) as fillet_5_piece_6:
        with BuildLine():
            CenterArc((FILLET_5_R, -FILLET_5_R), FILLET_5_R, 90, 90)
            Line((0, -FILLET_5_R), (0, 0))
            Line((0, 0), (FILLET_5_R, 0))
        make_face()
    extrude(amount=38, mode=Mode.SUBTRACT)
    with BuildSketch(Plane(origin=(-23.101604278, 36.700534759, 1), x_dir=(0, -1, 0), z_dir=(0, 0, 1))) as fillet_5_piece_7:
        with BuildLine():
            CenterArc((FILLET_5_R, FILLET_5_R), FILLET_5_R, 180, 90)
            Line((0, FILLET_5_R), (0, 0))
            Line((0, 0), (FILLET_5_R, 0))
        make_face()
    extrude(amount=18, mode=Mode.SUBTRACT)
    with BuildSketch(Plane(origin=(15.898395722, 35.700534759, 0), x_dir=(0, 1, 0), z_dir=(-1, 0, 0))) as fillet_5_piece_8:
        with BuildLine():
            CenterArc((1 - FILLET_5_R, -FILLET_5_R), FILLET_5_R, 0, 90)
            Line((1, -FILLET_5_R), (1, 0))
            Line((1, 0), (1 - FILLET_5_R, 0))
        make_face()
    revolve(axis=Axis((15.898395722, 35.700534759, 0), (0, 0, -1)), revolution_arc=90, mode=Mode.SUBTRACT)
    with BuildSketch(Plane(origin=(-23.101604278, 35.700534759, 19), x_dir=(0, 0, 1), z_dir=(0, -1, 0))) as fillet_5_piece_9:
        with BuildLine():
            CenterArc((1 - FILLET_5_R, -FILLET_5_R), FILLET_5_R, 0, 90)
            Line((1, -FILLET_5_R), (1, 0))
            Line((1, 0), (1 - FILLET_5_R, 0))
        make_face()
    revolve(axis=Axis((-23.101604278, 35.700534759, 19), (-1, 0, 0)), revolution_arc=90, mode=Mode.SUBTRACT)

    # 圆角8
    fillet_8_edges = [part.edges().sort_by_distance(p)[0] for p in [
        (24.898395722, 28.09692648, -0.019463146),
        (24.898395722, 28.09692648, 19.980536854),
    ]]
    fillet(fillet_8_edges, radius=FILLET_8_R)

    # 圆角9
    fillet_9_edges = [part.edges().sort_by_distance(p)[0] for p in [
        (-31.101604278, 28.130306202, 20),
        (-31.101604278, 28.130306202, -0.033379722),
    ]]
    fillet(fillet_9_edges, radius=FILLET_9_R)


solid = part.part
